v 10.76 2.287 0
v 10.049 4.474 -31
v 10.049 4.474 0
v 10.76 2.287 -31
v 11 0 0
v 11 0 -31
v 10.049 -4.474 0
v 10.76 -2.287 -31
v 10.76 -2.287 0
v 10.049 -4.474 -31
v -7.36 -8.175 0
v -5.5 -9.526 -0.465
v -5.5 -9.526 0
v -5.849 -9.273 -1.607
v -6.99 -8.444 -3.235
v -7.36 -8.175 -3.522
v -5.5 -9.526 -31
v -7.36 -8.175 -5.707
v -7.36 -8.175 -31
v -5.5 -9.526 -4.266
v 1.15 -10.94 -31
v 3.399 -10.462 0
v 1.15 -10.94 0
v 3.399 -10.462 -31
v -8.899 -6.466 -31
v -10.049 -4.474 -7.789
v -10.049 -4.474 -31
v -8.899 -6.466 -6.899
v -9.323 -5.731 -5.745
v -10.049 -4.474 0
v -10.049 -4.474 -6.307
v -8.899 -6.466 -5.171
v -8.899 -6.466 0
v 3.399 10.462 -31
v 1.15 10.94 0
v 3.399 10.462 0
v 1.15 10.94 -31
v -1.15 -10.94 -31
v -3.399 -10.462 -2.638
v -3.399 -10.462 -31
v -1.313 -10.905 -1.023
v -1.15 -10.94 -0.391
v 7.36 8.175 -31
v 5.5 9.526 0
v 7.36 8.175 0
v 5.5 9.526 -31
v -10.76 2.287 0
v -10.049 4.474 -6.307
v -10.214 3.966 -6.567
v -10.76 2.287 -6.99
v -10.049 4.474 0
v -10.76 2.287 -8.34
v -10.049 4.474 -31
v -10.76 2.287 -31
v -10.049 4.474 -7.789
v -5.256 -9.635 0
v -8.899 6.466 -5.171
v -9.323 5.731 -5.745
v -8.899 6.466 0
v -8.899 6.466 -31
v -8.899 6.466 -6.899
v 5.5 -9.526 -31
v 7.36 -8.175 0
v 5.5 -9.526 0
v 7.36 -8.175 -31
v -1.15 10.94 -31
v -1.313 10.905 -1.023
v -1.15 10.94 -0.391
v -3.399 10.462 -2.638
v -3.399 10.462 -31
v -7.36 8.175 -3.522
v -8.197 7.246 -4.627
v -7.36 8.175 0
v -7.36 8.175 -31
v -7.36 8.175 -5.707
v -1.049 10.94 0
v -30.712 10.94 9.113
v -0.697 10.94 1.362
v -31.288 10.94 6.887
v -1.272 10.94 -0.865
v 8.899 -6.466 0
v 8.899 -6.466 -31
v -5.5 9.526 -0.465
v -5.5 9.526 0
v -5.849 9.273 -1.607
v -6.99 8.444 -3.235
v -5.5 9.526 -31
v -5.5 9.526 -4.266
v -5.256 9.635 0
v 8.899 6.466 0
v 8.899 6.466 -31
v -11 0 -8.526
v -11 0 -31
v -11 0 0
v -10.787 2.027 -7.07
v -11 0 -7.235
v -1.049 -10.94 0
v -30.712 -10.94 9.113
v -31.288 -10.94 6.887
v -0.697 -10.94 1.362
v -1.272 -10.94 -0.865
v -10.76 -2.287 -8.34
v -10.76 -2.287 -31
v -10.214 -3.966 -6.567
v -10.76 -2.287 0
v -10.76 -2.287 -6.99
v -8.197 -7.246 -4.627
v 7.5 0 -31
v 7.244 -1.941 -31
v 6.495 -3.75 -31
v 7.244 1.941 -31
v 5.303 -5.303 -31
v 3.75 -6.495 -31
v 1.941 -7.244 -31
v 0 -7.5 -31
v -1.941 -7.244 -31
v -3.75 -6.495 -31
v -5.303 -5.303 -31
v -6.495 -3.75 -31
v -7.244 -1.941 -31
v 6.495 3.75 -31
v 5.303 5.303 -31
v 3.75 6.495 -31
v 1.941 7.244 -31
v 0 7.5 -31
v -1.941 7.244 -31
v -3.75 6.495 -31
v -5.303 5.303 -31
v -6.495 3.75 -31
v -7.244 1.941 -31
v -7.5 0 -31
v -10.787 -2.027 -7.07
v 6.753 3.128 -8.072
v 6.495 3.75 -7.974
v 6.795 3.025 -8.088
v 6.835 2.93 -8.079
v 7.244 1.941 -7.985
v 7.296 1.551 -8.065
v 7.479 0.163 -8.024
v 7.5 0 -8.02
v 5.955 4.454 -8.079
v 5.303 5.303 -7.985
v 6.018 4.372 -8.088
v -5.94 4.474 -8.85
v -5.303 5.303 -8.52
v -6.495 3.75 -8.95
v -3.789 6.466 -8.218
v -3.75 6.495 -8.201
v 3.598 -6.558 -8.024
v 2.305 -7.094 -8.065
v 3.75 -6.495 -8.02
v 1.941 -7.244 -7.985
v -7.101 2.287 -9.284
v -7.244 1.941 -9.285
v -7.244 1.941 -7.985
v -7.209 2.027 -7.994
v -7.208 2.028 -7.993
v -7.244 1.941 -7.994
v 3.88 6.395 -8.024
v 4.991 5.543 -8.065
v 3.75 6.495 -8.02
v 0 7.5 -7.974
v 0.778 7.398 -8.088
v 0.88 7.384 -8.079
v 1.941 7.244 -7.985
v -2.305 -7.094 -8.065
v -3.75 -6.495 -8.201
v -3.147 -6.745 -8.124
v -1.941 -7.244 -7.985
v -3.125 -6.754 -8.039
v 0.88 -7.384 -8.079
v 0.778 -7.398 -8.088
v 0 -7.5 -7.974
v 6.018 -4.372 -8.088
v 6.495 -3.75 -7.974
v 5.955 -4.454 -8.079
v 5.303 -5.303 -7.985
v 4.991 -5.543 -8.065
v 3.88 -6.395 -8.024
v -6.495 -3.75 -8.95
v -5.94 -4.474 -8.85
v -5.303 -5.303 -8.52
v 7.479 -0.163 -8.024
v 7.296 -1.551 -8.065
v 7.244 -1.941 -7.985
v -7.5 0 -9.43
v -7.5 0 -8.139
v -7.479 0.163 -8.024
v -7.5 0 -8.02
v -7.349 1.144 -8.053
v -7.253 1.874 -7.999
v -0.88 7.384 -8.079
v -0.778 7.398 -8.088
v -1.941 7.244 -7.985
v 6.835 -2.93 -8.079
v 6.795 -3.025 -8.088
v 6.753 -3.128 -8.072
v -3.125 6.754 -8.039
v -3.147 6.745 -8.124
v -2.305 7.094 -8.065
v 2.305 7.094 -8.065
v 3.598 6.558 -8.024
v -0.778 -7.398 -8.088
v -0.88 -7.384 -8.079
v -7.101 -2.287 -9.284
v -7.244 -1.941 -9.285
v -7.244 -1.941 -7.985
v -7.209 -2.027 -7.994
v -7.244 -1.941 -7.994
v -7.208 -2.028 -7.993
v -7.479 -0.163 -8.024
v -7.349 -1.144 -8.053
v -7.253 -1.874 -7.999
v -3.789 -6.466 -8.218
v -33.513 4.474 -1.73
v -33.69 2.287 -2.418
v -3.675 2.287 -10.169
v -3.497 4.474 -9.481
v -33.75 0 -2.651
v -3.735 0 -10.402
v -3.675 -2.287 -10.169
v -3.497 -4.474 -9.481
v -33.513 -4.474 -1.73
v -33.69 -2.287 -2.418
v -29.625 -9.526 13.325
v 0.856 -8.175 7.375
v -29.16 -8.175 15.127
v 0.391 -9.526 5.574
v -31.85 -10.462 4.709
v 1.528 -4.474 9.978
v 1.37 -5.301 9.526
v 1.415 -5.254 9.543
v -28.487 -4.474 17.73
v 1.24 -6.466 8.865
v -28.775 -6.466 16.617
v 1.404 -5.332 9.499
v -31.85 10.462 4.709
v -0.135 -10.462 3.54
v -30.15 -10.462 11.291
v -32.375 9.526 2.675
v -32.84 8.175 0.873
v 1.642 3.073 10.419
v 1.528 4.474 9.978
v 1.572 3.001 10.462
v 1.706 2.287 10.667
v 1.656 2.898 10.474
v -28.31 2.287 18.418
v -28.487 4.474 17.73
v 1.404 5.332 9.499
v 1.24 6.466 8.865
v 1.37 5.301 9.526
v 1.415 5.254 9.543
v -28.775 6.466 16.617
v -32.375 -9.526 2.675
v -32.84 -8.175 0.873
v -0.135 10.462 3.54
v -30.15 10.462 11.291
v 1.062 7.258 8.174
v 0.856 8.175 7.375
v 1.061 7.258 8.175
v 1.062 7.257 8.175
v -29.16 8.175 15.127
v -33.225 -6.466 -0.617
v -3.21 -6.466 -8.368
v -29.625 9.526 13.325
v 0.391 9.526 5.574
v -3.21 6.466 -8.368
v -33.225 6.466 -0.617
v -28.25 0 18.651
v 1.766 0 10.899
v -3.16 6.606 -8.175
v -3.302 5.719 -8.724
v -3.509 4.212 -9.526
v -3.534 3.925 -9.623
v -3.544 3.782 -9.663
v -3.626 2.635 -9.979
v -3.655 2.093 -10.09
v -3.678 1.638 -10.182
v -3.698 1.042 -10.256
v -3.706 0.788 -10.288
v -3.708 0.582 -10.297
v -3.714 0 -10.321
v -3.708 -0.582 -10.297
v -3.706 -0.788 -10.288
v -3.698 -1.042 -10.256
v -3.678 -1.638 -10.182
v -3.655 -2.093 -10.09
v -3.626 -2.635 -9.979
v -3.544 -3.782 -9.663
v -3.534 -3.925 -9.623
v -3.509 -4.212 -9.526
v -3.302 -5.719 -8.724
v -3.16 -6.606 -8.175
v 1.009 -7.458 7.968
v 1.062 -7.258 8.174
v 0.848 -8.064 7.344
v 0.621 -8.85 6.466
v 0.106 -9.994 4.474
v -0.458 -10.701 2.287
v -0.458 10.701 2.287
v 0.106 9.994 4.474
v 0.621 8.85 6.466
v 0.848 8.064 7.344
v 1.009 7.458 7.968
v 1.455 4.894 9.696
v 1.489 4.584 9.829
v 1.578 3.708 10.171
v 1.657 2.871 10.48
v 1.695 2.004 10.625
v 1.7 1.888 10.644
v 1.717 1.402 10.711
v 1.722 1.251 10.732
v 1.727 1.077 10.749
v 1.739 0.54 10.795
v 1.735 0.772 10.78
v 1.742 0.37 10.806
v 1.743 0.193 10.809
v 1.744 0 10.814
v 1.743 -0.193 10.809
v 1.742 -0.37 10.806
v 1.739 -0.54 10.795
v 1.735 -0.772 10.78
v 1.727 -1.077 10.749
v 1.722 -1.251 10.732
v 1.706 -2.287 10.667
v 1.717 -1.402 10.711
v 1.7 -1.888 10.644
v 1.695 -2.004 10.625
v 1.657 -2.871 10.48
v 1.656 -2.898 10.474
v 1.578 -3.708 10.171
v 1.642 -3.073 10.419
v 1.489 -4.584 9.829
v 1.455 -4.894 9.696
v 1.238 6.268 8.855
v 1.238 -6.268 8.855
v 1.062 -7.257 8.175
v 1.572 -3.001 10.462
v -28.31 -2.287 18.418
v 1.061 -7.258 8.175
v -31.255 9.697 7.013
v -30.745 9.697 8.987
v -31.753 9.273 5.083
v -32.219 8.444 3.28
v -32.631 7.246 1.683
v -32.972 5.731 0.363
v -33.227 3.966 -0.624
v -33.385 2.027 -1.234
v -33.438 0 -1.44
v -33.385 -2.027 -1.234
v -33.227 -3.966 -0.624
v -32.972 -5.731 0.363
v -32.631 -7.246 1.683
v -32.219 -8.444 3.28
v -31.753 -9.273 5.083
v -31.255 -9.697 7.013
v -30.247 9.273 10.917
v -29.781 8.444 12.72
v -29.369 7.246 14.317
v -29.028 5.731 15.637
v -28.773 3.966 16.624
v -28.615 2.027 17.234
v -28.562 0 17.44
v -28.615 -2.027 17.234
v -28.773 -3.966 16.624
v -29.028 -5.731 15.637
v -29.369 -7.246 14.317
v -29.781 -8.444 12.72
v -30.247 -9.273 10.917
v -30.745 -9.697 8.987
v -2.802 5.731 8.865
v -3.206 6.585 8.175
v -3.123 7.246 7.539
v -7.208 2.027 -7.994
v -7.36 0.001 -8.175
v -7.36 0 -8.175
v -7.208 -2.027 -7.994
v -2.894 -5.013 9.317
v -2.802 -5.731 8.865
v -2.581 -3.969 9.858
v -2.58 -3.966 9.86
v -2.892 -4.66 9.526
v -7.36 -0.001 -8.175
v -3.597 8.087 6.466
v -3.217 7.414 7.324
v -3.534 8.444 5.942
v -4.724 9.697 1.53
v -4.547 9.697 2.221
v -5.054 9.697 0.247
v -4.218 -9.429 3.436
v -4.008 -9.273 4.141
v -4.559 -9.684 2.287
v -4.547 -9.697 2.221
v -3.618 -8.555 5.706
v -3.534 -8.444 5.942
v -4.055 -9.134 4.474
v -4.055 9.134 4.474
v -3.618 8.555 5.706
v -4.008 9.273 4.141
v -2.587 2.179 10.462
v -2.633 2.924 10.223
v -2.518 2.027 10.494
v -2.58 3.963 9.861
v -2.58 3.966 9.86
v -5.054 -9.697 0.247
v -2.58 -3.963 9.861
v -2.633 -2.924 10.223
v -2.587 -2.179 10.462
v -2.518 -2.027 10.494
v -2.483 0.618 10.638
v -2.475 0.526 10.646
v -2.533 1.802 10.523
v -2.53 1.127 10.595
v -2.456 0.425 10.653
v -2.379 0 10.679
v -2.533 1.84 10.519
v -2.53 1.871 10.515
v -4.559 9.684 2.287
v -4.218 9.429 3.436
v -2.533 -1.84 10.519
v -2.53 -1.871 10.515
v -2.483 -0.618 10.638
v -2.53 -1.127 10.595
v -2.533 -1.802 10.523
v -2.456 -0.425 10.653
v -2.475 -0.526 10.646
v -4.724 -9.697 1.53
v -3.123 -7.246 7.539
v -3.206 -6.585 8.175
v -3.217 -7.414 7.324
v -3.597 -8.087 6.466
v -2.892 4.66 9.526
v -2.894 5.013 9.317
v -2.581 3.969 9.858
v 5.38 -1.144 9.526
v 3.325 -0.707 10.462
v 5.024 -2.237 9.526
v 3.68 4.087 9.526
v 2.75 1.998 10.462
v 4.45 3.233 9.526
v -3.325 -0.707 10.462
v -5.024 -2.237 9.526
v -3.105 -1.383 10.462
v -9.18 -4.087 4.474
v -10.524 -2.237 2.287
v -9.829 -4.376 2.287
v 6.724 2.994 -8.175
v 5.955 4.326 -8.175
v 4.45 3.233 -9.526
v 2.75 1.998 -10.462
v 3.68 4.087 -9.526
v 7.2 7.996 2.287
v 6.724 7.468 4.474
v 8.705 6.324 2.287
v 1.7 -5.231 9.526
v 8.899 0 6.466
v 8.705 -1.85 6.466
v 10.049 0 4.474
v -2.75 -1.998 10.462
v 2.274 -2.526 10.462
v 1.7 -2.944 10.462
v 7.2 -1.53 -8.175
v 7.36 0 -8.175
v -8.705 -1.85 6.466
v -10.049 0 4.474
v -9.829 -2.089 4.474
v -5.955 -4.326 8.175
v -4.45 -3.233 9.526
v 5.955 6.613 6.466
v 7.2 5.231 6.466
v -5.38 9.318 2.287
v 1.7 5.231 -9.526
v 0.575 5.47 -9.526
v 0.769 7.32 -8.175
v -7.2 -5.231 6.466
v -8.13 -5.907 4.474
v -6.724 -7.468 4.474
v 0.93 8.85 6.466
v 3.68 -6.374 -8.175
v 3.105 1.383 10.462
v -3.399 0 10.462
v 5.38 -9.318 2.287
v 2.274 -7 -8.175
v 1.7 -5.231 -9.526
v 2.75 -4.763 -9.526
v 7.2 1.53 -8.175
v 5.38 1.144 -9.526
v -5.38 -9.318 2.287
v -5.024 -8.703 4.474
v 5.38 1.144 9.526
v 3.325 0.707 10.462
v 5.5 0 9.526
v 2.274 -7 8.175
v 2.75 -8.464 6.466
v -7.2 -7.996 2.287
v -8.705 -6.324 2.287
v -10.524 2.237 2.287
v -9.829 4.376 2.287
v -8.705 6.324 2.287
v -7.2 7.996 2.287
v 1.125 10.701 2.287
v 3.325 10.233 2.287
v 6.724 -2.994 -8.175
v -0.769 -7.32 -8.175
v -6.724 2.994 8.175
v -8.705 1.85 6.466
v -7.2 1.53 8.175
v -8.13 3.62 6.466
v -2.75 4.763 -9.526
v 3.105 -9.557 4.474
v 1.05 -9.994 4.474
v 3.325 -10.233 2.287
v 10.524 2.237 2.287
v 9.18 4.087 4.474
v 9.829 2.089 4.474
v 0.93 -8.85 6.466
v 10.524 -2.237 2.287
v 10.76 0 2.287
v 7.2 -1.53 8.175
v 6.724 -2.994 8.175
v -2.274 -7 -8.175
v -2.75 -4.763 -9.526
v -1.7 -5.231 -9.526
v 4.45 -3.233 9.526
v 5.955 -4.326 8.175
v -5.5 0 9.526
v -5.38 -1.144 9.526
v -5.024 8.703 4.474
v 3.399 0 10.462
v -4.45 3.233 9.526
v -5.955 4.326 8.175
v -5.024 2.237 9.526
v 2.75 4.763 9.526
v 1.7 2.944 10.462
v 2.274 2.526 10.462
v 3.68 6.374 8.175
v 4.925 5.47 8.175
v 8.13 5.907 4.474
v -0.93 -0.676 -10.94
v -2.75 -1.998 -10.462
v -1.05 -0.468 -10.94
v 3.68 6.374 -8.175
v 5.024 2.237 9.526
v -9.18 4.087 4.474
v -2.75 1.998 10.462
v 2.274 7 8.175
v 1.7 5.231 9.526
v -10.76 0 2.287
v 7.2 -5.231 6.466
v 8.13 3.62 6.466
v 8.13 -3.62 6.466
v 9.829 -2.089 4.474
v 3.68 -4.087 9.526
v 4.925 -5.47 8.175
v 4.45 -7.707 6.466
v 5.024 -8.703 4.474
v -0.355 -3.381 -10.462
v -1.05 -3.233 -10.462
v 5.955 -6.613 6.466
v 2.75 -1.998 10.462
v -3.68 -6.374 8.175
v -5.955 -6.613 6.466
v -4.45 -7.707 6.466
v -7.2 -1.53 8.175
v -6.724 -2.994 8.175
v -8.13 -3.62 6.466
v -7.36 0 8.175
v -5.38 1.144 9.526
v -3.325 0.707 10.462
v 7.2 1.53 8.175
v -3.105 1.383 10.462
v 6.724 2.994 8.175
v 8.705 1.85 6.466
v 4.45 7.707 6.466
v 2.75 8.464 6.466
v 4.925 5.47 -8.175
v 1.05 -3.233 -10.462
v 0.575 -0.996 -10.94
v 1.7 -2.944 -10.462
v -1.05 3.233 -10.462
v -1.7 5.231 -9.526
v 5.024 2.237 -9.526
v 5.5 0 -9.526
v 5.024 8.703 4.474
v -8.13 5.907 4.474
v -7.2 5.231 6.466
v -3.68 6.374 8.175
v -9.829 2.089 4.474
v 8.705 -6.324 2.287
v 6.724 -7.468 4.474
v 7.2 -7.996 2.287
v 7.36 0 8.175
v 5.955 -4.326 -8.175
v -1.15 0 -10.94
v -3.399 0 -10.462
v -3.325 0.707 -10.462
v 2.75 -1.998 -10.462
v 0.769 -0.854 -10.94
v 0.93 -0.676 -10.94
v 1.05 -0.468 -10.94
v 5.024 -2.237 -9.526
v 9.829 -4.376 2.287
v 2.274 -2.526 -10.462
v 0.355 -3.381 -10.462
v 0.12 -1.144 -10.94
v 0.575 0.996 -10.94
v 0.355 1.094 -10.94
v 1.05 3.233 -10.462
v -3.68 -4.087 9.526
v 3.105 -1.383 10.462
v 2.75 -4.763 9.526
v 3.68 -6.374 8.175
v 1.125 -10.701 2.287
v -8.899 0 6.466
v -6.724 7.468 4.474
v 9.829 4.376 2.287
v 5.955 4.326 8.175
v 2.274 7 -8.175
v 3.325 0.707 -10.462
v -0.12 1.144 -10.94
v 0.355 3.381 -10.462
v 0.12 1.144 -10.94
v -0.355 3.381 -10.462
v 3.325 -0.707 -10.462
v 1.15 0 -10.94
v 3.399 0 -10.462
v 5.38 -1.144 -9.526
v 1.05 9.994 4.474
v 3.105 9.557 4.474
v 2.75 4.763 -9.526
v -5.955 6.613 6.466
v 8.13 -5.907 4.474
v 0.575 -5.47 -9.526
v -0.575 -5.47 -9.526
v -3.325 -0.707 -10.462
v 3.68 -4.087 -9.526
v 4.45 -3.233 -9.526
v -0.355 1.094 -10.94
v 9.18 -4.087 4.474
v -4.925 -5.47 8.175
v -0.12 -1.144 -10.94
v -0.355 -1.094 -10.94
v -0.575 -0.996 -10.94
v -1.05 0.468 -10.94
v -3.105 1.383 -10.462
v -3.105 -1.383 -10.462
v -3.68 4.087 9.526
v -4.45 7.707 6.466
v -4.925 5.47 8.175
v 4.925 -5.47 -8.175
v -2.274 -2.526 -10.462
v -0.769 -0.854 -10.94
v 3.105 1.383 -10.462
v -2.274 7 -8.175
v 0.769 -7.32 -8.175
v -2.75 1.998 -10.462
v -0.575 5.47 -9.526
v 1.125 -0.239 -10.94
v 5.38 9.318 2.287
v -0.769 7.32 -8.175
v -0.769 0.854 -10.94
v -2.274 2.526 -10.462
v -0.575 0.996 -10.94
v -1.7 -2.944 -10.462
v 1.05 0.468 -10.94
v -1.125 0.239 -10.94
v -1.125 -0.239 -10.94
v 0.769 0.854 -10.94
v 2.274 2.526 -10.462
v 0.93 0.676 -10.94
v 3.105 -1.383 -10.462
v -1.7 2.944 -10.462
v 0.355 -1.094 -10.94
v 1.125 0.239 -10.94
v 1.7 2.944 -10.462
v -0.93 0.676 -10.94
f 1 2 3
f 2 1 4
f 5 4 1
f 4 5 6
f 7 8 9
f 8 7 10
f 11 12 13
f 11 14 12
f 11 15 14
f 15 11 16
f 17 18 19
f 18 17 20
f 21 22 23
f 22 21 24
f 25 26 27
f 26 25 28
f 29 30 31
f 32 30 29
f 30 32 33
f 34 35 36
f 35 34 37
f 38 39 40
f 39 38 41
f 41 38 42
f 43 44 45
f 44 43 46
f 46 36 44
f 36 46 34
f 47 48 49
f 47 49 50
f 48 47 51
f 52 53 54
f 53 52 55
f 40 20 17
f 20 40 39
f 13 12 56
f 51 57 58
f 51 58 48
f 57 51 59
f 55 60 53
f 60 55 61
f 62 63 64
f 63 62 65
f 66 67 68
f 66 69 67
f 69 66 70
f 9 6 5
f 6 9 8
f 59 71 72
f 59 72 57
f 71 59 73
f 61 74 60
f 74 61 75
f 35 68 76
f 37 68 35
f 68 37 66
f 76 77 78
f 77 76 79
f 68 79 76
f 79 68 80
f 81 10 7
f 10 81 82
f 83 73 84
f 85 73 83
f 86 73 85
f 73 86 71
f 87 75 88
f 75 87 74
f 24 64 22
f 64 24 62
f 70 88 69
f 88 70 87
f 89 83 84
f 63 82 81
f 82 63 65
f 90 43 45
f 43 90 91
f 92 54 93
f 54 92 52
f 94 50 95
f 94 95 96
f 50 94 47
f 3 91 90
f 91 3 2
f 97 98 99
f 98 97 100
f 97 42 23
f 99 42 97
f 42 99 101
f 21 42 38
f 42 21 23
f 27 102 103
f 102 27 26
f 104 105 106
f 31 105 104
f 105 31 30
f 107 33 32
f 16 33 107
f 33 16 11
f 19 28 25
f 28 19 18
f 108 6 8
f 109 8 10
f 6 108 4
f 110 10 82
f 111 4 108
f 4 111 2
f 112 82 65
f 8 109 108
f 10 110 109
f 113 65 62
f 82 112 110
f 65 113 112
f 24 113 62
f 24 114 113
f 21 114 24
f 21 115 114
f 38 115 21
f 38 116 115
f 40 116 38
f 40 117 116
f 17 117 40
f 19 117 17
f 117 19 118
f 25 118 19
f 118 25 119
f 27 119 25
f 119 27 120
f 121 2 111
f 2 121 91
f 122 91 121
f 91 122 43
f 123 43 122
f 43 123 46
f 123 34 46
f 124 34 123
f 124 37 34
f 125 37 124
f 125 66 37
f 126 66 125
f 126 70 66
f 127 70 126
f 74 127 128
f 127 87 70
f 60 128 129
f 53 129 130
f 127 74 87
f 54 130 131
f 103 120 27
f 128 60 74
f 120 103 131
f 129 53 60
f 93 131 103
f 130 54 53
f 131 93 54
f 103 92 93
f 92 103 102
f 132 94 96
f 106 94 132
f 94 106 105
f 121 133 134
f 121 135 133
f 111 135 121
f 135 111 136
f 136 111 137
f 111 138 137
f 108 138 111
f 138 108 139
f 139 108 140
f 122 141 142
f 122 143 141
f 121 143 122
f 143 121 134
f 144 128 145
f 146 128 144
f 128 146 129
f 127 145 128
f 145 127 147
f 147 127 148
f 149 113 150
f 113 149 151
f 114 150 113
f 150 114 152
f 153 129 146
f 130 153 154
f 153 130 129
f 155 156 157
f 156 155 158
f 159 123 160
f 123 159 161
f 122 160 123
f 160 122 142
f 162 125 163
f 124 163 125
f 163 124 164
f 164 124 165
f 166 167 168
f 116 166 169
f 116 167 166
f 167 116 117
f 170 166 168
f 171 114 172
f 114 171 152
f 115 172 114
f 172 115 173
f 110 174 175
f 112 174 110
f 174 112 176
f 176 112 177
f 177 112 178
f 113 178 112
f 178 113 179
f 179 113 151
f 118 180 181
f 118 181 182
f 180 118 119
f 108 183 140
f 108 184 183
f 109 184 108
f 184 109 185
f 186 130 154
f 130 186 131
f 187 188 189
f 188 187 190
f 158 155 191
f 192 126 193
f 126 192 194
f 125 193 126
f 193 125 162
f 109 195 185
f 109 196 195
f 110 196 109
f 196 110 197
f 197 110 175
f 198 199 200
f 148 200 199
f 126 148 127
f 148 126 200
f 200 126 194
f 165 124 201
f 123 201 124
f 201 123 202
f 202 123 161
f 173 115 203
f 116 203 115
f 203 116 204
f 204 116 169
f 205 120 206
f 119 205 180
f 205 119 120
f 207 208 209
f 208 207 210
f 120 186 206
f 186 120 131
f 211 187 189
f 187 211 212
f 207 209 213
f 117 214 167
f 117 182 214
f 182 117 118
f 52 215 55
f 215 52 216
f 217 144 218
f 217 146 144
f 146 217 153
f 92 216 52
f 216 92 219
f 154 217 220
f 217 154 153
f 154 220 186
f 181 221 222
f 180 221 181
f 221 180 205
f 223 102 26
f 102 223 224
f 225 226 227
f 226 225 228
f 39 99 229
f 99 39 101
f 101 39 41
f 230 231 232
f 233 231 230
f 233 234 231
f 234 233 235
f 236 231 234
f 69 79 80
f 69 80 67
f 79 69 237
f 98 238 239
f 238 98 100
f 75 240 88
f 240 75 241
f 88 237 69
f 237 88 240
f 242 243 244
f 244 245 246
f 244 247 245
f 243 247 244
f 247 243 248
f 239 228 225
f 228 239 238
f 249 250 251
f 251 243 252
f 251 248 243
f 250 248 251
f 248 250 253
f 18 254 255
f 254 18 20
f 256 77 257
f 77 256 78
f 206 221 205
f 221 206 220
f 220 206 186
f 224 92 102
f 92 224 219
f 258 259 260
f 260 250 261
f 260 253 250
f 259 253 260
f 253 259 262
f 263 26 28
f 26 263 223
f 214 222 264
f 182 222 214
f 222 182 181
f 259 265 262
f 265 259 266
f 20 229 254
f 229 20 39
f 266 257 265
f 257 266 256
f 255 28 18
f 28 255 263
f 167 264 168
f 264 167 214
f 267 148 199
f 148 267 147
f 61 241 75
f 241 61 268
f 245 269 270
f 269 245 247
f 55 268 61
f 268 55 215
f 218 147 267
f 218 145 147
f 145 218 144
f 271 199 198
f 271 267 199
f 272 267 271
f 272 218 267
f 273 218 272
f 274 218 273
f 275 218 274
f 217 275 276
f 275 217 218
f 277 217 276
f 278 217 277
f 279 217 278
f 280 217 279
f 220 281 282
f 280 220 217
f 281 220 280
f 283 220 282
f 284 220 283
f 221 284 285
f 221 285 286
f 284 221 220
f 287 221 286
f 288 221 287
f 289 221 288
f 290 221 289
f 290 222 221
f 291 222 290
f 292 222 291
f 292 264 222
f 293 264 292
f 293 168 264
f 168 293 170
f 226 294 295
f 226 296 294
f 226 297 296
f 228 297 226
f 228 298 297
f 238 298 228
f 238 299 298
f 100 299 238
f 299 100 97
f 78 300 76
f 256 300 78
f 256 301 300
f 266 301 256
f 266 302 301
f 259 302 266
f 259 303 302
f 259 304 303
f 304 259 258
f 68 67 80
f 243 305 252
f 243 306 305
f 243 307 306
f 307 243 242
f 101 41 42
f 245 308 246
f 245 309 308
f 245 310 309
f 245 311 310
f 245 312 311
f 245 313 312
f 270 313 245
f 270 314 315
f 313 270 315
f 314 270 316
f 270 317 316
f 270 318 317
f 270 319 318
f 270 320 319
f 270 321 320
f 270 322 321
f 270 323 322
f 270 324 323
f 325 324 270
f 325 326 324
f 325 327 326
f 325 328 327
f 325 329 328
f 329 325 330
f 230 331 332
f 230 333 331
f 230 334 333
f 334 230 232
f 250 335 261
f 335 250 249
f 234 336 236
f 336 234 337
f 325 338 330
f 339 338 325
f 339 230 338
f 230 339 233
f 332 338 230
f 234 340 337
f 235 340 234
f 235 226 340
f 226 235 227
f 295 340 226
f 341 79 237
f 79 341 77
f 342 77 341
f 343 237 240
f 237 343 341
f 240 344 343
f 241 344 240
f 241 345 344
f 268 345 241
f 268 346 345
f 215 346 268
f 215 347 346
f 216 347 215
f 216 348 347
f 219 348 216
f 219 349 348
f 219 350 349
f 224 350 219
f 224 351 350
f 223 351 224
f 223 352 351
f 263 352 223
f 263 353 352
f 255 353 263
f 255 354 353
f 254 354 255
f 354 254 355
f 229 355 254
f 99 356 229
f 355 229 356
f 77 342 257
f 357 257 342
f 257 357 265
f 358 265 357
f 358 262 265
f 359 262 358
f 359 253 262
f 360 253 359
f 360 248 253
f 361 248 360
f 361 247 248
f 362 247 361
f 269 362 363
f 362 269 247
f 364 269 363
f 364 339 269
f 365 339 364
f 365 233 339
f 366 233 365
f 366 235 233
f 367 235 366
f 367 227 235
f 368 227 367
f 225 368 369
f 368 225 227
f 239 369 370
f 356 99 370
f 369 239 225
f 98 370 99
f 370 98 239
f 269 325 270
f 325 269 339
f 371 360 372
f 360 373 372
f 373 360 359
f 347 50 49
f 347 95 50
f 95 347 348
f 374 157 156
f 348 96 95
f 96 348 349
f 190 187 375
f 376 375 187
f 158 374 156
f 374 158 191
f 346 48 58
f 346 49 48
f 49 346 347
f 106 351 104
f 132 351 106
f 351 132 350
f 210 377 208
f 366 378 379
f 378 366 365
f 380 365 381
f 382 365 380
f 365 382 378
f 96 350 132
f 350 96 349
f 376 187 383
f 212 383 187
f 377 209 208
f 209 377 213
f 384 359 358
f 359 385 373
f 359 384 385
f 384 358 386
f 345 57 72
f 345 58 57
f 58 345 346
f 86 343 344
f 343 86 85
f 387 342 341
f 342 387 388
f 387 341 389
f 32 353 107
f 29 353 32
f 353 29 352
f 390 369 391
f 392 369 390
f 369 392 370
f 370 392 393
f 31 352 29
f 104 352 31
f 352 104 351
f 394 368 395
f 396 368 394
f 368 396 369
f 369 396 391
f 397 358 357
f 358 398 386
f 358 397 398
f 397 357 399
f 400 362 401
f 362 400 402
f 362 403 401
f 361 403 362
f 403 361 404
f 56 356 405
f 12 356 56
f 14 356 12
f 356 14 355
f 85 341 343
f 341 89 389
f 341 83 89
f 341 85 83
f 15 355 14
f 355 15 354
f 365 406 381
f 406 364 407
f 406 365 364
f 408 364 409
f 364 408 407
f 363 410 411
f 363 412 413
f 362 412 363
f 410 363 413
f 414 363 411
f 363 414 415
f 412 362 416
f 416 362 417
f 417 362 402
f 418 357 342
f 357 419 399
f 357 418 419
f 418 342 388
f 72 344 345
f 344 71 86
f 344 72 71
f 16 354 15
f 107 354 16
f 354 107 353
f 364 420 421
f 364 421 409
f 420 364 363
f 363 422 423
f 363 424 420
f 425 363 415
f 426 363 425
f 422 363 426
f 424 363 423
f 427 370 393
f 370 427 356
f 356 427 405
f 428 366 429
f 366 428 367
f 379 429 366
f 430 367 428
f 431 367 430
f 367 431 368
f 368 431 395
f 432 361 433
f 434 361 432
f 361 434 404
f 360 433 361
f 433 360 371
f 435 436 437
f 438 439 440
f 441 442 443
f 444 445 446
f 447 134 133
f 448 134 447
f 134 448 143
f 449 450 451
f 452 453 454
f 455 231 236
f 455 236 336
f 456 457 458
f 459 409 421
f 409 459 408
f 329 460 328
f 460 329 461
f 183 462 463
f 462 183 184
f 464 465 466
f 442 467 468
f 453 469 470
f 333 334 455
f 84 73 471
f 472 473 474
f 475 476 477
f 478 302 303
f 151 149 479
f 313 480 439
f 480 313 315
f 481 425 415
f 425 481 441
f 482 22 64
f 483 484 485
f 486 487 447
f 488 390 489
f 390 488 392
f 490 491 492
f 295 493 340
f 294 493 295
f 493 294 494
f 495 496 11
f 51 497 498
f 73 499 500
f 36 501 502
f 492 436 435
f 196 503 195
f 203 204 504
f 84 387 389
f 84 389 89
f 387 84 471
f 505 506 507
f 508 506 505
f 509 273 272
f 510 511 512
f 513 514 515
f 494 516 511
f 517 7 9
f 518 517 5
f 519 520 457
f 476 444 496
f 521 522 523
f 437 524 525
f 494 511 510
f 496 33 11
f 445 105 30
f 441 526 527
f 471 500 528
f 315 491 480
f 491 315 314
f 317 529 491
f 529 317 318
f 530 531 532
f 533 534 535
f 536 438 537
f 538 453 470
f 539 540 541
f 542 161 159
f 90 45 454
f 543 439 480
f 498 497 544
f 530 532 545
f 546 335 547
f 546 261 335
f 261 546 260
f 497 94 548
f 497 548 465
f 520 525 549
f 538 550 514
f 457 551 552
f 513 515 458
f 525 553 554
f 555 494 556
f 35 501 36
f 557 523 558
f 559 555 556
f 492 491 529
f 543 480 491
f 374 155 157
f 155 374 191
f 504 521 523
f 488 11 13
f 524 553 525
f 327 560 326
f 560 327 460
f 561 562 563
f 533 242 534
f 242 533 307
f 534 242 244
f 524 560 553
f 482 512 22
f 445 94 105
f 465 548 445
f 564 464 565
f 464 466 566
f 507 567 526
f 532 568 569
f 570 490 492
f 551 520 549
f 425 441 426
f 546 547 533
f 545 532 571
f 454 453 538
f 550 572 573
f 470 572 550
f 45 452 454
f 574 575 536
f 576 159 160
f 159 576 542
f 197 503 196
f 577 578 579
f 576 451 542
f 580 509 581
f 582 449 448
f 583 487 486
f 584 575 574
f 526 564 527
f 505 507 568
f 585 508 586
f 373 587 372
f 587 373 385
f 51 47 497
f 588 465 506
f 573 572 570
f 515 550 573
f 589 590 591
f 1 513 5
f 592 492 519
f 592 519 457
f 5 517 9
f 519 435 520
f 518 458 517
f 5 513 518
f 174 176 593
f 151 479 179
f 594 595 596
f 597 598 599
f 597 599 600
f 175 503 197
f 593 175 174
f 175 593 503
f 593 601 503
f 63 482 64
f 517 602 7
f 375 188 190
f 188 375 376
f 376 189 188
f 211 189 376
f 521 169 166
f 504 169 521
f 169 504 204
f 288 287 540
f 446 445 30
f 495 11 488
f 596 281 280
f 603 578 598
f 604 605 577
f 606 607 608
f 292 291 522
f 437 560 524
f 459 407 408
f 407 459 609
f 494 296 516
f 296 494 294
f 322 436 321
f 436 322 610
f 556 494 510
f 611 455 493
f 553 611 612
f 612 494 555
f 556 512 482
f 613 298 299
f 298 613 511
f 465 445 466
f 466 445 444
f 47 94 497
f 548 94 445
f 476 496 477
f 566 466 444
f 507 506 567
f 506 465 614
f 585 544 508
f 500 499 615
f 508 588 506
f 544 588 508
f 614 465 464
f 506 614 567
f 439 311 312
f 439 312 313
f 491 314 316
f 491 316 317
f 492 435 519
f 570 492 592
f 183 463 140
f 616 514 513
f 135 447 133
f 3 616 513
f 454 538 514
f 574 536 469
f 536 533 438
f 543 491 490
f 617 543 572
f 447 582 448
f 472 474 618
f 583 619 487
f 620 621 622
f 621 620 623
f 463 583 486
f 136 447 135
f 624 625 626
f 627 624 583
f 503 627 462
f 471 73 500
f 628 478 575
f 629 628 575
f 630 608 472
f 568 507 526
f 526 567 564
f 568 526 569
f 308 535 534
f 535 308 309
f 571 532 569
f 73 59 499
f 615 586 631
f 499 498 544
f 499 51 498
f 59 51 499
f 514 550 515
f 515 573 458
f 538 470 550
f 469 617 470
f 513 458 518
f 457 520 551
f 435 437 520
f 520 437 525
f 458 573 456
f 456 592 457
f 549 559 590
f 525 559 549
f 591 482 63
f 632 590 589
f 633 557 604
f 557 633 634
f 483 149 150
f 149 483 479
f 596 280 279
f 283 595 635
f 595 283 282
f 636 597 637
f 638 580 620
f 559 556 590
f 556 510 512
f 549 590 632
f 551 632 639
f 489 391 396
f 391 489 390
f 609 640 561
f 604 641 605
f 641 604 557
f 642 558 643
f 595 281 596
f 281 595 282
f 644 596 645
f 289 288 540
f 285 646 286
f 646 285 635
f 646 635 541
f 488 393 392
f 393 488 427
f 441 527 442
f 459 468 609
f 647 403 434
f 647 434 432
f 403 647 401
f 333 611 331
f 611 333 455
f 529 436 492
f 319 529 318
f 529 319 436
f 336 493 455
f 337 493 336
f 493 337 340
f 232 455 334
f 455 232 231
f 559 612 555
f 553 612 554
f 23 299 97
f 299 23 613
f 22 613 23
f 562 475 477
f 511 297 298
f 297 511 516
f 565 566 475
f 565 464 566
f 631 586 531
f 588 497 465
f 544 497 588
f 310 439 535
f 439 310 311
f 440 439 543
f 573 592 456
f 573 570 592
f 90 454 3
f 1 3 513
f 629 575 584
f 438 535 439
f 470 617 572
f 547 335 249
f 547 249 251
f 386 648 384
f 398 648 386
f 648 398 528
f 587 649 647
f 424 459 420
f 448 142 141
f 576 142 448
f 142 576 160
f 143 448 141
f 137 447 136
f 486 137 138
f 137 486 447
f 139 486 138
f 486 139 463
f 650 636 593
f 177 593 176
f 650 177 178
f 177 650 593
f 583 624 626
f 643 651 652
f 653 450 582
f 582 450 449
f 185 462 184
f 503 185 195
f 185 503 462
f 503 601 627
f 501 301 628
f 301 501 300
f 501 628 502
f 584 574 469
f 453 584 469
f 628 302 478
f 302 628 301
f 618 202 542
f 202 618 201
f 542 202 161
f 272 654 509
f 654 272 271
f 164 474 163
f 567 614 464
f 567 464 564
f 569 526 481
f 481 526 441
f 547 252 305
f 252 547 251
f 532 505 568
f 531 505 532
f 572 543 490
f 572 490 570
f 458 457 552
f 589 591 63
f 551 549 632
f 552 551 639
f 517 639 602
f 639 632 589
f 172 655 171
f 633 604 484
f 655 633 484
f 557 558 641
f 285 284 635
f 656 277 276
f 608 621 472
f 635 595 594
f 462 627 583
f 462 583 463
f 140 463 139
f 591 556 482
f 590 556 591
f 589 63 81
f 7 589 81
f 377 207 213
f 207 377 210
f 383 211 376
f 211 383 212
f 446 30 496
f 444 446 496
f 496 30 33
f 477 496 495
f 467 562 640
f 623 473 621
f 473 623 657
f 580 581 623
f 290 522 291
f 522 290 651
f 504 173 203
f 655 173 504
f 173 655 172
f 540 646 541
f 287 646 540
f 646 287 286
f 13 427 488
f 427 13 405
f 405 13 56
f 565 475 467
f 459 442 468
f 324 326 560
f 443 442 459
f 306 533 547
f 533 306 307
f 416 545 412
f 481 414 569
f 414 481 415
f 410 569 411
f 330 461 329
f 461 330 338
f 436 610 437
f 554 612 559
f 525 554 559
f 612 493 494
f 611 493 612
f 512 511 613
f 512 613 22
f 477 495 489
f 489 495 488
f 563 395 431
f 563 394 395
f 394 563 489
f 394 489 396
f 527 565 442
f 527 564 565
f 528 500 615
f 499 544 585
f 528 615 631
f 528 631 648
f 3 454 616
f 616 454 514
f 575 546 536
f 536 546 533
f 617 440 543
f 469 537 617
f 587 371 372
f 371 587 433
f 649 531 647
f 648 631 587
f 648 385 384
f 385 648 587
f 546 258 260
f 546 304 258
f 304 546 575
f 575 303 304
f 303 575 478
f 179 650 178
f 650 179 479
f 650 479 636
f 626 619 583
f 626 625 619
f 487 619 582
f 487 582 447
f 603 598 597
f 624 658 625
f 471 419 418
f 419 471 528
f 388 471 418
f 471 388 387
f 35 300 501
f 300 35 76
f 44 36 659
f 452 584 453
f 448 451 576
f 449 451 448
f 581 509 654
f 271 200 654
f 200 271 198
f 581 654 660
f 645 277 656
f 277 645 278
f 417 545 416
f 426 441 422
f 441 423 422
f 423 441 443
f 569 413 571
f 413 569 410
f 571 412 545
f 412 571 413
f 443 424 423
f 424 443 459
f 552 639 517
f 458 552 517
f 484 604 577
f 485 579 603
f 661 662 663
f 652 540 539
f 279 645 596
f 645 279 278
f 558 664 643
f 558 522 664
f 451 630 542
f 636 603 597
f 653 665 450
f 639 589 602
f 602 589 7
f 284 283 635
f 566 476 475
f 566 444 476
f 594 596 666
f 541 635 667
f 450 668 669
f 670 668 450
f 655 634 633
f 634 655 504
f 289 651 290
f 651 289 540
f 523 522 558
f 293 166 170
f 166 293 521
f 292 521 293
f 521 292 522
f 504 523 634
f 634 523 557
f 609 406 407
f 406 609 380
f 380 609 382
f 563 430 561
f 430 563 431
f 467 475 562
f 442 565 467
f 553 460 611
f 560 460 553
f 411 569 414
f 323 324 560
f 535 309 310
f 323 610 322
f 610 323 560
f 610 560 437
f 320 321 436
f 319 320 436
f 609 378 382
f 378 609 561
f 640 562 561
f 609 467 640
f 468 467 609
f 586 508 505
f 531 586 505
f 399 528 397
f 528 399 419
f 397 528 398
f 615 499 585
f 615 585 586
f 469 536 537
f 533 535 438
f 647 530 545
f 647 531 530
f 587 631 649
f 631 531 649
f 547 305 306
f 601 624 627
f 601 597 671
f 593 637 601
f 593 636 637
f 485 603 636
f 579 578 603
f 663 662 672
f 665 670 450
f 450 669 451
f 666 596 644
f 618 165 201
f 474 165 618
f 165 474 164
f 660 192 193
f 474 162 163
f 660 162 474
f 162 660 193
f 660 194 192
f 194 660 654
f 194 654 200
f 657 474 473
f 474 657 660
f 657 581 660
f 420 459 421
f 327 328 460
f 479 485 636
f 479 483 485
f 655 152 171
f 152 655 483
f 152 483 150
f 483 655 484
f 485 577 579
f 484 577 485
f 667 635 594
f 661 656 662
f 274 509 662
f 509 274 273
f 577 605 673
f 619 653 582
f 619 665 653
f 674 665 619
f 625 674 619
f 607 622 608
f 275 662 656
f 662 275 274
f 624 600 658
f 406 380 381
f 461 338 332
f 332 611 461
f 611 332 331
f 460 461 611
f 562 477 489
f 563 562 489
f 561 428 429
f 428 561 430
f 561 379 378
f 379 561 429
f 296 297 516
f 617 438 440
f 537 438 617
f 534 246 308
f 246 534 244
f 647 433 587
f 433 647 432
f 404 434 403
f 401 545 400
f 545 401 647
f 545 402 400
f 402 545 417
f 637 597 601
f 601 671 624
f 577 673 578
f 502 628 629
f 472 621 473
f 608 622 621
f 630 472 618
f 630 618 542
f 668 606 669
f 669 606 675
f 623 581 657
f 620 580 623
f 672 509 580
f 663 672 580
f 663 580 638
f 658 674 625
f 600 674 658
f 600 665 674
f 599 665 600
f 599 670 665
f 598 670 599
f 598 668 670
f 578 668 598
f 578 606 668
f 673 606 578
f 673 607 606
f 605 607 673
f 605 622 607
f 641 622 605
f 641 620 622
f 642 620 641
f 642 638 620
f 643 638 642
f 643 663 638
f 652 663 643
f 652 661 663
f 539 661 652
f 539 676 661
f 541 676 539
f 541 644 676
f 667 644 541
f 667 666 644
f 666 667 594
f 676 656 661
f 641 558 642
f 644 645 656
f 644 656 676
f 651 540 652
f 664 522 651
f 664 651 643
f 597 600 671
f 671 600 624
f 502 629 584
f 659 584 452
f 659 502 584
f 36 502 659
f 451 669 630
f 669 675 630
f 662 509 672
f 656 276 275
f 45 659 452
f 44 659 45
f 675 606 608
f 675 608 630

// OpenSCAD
width=10;

sphere (11);

//cylinder 1 z たて
difference(){
    translate ([0,0,-31])cylinder(h=31, d=22);
    translate([0,0,-33])cylinder(h=30, d=15);
}



//cylinder 3        
translate([-31,0,8]) rotate([0,104.48,0])difference(){
        cylinder (h=31, d=22);
        translate([0,0,+3]) ;
        cylinder(h=30, d=19.5); 
        }
